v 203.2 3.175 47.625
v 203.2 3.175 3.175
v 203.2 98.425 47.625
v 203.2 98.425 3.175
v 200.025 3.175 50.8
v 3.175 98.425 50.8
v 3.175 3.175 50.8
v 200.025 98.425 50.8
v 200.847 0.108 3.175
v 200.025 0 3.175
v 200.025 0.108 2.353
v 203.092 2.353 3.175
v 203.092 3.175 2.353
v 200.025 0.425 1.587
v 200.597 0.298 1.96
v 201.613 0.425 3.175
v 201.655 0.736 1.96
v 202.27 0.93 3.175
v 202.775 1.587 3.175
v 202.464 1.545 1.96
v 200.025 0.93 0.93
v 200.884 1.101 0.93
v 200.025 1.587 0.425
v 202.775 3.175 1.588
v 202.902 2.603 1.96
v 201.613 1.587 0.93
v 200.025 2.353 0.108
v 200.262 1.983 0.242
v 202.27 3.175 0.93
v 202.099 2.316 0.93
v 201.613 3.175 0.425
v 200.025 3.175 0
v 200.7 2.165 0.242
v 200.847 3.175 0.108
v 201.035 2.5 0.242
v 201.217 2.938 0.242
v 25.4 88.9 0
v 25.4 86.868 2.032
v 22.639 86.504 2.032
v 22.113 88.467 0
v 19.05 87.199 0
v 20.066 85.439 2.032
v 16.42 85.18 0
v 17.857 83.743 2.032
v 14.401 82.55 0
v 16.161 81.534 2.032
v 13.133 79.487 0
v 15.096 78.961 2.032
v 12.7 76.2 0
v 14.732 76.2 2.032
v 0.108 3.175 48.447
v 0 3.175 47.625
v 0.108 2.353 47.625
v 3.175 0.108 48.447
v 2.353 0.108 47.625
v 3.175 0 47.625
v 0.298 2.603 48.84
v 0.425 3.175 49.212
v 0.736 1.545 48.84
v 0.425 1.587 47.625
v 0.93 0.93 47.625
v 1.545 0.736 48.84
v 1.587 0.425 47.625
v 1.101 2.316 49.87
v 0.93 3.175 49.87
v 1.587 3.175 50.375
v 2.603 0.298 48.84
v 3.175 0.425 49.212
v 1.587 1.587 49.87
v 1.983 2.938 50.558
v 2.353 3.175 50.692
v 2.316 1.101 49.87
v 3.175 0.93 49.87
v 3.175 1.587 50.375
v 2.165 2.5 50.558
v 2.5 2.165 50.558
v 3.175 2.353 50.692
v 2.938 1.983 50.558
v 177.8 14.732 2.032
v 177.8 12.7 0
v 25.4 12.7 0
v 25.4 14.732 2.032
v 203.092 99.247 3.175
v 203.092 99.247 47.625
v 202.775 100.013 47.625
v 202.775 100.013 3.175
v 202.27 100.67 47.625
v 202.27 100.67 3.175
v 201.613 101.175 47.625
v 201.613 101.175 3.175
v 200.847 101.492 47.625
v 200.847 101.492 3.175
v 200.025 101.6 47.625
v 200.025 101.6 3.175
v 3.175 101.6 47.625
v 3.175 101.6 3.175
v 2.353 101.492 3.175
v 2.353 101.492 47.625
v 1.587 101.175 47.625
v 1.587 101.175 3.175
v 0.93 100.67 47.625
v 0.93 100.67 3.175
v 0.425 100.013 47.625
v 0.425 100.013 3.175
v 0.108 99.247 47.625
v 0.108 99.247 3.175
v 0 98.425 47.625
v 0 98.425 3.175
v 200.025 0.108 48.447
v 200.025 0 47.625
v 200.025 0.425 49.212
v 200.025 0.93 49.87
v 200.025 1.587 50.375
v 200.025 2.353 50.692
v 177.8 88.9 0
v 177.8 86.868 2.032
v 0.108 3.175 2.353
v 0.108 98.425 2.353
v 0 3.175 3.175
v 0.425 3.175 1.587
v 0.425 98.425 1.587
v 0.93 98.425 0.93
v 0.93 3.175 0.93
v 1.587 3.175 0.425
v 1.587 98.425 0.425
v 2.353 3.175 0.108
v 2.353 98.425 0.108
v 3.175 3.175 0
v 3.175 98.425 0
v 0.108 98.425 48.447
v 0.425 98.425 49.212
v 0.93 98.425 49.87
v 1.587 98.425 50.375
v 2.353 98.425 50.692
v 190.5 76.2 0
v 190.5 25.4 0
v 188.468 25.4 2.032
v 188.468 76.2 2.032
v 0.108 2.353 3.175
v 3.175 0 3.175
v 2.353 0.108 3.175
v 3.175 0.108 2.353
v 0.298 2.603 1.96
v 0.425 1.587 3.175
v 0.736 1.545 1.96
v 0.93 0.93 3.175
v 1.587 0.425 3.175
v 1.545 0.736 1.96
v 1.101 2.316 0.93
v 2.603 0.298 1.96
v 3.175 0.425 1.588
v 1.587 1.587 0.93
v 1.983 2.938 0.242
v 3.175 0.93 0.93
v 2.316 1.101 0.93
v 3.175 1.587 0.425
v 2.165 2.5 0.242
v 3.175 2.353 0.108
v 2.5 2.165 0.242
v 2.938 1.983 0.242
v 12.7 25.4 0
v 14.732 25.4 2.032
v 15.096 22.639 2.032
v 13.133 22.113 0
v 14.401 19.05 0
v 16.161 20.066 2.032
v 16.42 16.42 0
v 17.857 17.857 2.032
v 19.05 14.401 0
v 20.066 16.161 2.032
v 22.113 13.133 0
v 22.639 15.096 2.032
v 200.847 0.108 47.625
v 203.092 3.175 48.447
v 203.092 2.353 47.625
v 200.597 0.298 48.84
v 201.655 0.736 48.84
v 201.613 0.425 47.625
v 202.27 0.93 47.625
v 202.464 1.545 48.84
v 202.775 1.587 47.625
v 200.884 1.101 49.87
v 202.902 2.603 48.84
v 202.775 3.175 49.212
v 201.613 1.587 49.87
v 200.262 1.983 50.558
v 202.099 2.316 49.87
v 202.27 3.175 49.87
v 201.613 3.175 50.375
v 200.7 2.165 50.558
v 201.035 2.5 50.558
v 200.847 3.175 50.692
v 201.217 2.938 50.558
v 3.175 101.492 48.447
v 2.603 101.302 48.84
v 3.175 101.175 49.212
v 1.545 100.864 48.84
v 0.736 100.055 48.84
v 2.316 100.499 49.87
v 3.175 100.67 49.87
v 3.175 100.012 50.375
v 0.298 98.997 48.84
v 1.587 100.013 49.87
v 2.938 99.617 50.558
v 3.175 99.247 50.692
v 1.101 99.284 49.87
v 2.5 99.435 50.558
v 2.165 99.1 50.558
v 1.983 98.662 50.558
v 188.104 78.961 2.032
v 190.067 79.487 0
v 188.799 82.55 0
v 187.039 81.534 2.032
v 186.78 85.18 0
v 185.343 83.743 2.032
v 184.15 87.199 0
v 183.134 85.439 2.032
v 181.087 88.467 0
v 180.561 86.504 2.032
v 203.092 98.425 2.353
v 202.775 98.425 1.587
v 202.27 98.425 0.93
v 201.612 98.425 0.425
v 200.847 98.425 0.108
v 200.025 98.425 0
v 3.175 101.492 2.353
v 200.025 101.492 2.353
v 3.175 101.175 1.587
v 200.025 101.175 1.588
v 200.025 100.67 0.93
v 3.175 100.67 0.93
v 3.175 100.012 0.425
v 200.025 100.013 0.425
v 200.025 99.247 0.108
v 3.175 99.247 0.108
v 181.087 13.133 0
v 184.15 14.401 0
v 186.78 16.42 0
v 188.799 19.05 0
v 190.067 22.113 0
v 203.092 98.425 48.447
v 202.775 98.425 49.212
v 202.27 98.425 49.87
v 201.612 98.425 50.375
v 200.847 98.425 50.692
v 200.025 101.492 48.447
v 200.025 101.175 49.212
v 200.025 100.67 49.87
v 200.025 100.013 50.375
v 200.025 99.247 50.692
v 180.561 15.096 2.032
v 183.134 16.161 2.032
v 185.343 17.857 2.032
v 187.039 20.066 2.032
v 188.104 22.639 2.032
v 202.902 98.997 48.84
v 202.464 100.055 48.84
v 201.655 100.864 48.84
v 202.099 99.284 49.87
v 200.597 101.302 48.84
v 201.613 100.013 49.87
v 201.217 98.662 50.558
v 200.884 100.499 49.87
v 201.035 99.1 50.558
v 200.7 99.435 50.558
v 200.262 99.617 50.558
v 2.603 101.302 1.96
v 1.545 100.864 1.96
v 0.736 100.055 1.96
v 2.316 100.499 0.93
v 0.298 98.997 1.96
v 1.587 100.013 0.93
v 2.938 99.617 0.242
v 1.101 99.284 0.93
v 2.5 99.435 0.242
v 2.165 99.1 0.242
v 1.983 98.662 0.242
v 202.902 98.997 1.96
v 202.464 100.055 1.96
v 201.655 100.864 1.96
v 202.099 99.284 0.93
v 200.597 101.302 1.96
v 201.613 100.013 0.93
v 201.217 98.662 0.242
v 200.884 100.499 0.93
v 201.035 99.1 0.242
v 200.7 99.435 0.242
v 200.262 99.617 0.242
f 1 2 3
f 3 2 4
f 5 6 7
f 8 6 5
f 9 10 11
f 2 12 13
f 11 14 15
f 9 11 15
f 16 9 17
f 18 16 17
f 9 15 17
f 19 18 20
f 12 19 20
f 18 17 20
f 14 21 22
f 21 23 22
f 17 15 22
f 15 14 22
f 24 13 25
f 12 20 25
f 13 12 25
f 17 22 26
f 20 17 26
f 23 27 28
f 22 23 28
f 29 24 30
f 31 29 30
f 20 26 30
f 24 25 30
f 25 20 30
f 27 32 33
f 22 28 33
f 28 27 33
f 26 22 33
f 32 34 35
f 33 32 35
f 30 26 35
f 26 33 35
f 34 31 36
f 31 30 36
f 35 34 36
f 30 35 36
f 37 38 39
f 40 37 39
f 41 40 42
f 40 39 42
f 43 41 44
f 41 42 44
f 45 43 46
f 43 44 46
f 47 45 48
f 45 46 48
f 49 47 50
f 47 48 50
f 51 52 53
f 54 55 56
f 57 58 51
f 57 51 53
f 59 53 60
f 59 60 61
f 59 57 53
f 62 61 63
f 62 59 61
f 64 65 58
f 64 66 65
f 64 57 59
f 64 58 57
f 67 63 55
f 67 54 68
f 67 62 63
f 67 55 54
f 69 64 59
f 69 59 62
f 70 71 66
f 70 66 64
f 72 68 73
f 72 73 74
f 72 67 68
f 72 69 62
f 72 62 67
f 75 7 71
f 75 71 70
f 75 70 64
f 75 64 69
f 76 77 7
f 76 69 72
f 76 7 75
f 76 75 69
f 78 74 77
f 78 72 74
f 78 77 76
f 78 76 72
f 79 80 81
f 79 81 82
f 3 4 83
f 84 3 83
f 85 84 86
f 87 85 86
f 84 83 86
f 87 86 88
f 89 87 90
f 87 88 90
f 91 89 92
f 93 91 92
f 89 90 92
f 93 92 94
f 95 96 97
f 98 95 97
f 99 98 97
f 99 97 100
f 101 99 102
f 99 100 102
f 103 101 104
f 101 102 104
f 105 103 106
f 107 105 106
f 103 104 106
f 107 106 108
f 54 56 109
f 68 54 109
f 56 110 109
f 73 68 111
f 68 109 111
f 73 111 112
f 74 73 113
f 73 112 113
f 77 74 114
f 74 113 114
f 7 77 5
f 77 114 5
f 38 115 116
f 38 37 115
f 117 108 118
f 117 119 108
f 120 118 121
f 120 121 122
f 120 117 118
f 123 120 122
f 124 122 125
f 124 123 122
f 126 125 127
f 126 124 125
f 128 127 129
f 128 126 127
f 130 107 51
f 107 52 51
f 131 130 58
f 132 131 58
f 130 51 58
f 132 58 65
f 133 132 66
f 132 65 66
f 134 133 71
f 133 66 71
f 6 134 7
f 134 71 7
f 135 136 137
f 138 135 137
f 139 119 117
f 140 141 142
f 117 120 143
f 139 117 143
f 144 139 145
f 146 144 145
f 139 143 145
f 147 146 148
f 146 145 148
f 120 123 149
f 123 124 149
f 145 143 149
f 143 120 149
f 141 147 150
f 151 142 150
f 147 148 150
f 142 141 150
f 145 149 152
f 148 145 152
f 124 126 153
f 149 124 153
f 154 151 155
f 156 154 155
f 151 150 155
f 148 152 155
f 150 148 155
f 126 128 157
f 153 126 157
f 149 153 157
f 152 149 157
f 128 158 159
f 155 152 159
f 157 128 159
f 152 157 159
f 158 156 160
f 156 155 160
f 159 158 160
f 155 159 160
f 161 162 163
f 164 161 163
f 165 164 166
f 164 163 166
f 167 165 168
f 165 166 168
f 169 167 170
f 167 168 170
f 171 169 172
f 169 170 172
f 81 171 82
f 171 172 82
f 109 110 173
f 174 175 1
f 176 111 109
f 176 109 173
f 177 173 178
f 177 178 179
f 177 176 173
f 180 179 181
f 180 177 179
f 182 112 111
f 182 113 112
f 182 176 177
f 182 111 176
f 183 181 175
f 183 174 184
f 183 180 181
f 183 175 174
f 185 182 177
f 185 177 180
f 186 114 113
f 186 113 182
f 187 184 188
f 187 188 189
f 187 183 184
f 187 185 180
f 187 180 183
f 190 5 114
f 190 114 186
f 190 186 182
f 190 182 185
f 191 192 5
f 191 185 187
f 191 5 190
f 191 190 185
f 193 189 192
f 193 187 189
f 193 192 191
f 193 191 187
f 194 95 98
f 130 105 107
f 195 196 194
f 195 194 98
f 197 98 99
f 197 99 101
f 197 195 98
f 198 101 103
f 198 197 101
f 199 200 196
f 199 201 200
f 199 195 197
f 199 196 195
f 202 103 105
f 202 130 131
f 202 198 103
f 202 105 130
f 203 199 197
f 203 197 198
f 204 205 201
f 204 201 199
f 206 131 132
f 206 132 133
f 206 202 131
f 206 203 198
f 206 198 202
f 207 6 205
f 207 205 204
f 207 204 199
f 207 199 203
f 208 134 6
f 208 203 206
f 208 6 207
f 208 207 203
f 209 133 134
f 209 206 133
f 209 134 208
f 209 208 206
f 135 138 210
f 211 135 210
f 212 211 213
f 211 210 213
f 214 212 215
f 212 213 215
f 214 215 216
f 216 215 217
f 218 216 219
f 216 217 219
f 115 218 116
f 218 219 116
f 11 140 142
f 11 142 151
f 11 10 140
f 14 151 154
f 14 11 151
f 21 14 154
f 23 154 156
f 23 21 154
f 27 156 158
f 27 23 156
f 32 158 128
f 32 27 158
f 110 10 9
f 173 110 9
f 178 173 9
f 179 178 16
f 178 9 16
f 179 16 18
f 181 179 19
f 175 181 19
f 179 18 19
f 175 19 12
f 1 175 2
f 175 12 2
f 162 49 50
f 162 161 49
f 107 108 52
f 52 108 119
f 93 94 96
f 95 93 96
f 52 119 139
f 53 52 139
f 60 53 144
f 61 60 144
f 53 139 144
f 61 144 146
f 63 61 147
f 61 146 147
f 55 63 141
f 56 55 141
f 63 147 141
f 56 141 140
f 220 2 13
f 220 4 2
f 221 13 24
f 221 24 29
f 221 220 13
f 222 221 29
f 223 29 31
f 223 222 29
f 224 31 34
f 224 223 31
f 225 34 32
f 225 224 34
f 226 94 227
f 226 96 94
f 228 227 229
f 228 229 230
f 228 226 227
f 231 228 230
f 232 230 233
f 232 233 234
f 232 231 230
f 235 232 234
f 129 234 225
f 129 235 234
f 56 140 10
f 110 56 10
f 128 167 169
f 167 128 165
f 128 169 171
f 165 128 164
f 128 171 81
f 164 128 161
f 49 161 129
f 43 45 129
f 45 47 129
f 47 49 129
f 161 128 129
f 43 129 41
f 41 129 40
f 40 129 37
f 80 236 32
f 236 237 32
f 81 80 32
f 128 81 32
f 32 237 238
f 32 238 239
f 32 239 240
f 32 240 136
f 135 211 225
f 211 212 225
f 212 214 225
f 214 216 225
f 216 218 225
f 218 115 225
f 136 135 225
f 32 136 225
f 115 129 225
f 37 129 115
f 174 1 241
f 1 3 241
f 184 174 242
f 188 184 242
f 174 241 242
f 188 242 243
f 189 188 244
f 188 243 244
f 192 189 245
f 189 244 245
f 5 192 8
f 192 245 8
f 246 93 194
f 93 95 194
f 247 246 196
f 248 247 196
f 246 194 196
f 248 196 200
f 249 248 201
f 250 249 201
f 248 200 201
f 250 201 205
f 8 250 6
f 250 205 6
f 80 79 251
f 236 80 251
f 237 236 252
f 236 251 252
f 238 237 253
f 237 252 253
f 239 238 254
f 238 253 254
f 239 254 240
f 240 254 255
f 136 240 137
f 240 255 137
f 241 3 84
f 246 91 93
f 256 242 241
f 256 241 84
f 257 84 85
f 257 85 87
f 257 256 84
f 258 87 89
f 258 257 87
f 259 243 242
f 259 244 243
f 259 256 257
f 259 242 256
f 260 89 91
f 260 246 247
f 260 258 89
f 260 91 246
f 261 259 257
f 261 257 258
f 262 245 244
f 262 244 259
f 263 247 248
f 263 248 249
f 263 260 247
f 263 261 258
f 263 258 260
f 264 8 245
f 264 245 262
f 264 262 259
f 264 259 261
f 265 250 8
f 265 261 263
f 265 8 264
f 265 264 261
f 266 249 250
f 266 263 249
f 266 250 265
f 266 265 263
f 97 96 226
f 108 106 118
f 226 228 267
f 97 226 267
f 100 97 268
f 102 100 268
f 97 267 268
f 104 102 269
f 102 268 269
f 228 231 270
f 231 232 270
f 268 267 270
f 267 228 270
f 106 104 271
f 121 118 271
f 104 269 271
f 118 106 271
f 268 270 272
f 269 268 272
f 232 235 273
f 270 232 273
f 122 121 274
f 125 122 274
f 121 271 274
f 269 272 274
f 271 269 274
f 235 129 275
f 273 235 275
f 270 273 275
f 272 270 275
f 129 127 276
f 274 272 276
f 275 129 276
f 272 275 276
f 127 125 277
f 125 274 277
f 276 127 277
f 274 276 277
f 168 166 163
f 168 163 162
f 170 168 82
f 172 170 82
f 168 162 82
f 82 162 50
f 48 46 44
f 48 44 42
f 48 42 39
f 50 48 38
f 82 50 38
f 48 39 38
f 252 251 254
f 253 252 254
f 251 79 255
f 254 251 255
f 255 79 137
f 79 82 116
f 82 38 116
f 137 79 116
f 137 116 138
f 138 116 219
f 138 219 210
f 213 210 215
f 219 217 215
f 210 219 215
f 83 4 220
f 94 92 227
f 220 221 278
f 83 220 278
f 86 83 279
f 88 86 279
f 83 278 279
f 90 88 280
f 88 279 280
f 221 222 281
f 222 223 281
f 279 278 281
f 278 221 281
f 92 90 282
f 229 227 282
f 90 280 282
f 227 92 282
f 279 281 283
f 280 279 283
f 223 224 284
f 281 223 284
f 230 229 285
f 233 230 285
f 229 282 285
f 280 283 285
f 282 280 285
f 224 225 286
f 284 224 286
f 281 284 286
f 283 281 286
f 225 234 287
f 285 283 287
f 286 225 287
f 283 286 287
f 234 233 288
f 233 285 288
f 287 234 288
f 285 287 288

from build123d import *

# Parameters (mm, degrees)
F1_DEPTH = 50.8
F2_R     = 3.175
F3_R     = 3.175
F4_DEPTH = 2.032
F4_TAPER = 45


with BuildPart() as f1:
    # F0 (on Top) → F1 (new body)
    with BuildSketch(Plane.XY):
        with BuildLine():
            ThreePointArc((0, 3.175), (0.9299359697, 0.9299359697), (3.175, 0))
            Line((3.175, 0), (200.025, 0))
            ThreePointArc((200.025, 0), (202.2700640303, 0.9299359697), (203.2, 3.175))
            Line((203.2, 3.175), (203.2, 98.425))
            ThreePointArc((203.2, 98.425), (202.2700640303, 100.6700640303), (200.025, 101.6))
            Line((200.025, 101.6), (3.175, 101.6))
            ThreePointArc((3.175, 101.6), (0.9299359697, 100.6700640303), (0, 98.425))
            Line((0, 98.425), (0, 3.175))
        make_face()
        with BuildLine():
            ThreePointArc((12.7000001431, 76.1999998569), (16.419744022, 85.180255978), (25.4000001431, 88.8999998569))
            Line((25.4000001431, 88.8999998569), (177.7999998569, 88.8999998569))
            ThreePointArc((177.7999998569, 88.8999998569), (186.780255978, 85.180255978), (190.4999998569, 76.1999998569))
            Line((190.4999998569, 76.1999998569), (190.4999998569, 25.4000001431))
            ThreePointArc((190.4999998569, 25.4000001431), (186.780255978, 16.419744022), (177.7999998569, 12.7000001431))
            Line((177.7999998569, 12.7000001431), (25.4000001431, 12.7000001431))
            ThreePointArc((25.4000001431, 12.7000001431), (16.419744022, 16.419744022), (12.7000001431, 25.4000001431))
            Line((12.7000001431, 25.4000001431), (12.7000001431, 76.1999998569))
        make_face(mode=Mode.SUBTRACT)
        with BuildLine():
            Line((177.7999998569, 88.8999998569), (25.4000001431, 88.8999998569))
            ThreePointArc((25.4000001431, 88.8999998569), (16.419744022, 85.180255978), (12.7000001431, 76.1999998569))
            Line((12.7000001431, 76.1999998569), (12.7000001431, 25.4000001431))
            ThreePointArc((12.7000001431, 25.4000001431), (16.419744022, 16.419744022), (25.4000001431, 12.7000001431))
            Line((25.4000001431, 12.7000001431), (177.7999998569, 12.7000001431))
            ThreePointArc((177.7999998569, 12.7000001431), (186.780255978, 16.419744022), (190.4999998569, 25.4000001431))
            Line((190.4999998569, 25.4000001431), (190.4999998569, 76.1999998569))
            ThreePointArc((190.4999998569, 76.1999998569), (186.780255978, 85.180255978), (177.7999998569, 88.8999998569))
        make_face()
    extrude(amount=F1_DEPTH)

    # F2
    f2_edges = [f1.edges().sort_by_distance(p)[0] for p in [
        (0, 50.8, 0),
        (0.929936, 0.929936, 0),
        (101.6, 0, 0),
        (202.270064, 0.929936, 0),
        (203.2, 50.8, 0),
        (202.270064, 100.670064, 0),
        (101.6, 101.6, 0),
        (0.929936, 100.670064, 0),
    ]]
    fillet(f2_edges, radius=F2_R)

    # F3
    f3_edges = [f1.edges().sort_by_distance(p)[0] for p in [
        (0, 50.8, 50.8),
        (0.929936, 0.929936, 50.8),
        (101.6, 0, 50.8),
        (202.270064, 0.929936, 50.8),
        (203.2, 50.8, 50.8),
        (202.270064, 100.670064, 50.8),
        (101.6, 101.6, 50.8),
        (0.929936, 100.670064, 50.8),
    ]]
    fillet(f3_edges, radius=F3_R)

    # F0 (on Top) → F4 (cut)
    with BuildSketch(Plane.XY):
        with BuildLine():
            Line((177.7999998569, 88.8999998569), (25.4000001431, 88.8999998569))
            ThreePointArc((25.4000001431, 88.8999998569), (16.419744022, 85.180255978), (12.7000001431, 76.1999998569))
            Line((12.7000001431, 76.1999998569), (12.7000001431, 25.4000001431))
            ThreePointArc((12.7000001431, 25.4000001431), (16.419744022, 16.419744022), (25.4000001431, 12.7000001431))
            Line((25.4000001431, 12.7000001431), (177.7999998569, 12.7000001431))
            ThreePointArc((177.7999998569, 12.7000001431), (186.780255978, 16.419744022), (190.4999998569, 25.4000001431))
            Line((190.4999998569, 25.4000001431), (190.4999998569, 76.1999998569))
            ThreePointArc((190.4999998569, 76.1999998569), (186.780255978, 85.180255978), (177.7999998569, 88.8999998569))
        make_face()
    extrude(amount=F4_DEPTH, taper=F4_TAPER, mode=Mode.SUBTRACT)


solid = f1.part
